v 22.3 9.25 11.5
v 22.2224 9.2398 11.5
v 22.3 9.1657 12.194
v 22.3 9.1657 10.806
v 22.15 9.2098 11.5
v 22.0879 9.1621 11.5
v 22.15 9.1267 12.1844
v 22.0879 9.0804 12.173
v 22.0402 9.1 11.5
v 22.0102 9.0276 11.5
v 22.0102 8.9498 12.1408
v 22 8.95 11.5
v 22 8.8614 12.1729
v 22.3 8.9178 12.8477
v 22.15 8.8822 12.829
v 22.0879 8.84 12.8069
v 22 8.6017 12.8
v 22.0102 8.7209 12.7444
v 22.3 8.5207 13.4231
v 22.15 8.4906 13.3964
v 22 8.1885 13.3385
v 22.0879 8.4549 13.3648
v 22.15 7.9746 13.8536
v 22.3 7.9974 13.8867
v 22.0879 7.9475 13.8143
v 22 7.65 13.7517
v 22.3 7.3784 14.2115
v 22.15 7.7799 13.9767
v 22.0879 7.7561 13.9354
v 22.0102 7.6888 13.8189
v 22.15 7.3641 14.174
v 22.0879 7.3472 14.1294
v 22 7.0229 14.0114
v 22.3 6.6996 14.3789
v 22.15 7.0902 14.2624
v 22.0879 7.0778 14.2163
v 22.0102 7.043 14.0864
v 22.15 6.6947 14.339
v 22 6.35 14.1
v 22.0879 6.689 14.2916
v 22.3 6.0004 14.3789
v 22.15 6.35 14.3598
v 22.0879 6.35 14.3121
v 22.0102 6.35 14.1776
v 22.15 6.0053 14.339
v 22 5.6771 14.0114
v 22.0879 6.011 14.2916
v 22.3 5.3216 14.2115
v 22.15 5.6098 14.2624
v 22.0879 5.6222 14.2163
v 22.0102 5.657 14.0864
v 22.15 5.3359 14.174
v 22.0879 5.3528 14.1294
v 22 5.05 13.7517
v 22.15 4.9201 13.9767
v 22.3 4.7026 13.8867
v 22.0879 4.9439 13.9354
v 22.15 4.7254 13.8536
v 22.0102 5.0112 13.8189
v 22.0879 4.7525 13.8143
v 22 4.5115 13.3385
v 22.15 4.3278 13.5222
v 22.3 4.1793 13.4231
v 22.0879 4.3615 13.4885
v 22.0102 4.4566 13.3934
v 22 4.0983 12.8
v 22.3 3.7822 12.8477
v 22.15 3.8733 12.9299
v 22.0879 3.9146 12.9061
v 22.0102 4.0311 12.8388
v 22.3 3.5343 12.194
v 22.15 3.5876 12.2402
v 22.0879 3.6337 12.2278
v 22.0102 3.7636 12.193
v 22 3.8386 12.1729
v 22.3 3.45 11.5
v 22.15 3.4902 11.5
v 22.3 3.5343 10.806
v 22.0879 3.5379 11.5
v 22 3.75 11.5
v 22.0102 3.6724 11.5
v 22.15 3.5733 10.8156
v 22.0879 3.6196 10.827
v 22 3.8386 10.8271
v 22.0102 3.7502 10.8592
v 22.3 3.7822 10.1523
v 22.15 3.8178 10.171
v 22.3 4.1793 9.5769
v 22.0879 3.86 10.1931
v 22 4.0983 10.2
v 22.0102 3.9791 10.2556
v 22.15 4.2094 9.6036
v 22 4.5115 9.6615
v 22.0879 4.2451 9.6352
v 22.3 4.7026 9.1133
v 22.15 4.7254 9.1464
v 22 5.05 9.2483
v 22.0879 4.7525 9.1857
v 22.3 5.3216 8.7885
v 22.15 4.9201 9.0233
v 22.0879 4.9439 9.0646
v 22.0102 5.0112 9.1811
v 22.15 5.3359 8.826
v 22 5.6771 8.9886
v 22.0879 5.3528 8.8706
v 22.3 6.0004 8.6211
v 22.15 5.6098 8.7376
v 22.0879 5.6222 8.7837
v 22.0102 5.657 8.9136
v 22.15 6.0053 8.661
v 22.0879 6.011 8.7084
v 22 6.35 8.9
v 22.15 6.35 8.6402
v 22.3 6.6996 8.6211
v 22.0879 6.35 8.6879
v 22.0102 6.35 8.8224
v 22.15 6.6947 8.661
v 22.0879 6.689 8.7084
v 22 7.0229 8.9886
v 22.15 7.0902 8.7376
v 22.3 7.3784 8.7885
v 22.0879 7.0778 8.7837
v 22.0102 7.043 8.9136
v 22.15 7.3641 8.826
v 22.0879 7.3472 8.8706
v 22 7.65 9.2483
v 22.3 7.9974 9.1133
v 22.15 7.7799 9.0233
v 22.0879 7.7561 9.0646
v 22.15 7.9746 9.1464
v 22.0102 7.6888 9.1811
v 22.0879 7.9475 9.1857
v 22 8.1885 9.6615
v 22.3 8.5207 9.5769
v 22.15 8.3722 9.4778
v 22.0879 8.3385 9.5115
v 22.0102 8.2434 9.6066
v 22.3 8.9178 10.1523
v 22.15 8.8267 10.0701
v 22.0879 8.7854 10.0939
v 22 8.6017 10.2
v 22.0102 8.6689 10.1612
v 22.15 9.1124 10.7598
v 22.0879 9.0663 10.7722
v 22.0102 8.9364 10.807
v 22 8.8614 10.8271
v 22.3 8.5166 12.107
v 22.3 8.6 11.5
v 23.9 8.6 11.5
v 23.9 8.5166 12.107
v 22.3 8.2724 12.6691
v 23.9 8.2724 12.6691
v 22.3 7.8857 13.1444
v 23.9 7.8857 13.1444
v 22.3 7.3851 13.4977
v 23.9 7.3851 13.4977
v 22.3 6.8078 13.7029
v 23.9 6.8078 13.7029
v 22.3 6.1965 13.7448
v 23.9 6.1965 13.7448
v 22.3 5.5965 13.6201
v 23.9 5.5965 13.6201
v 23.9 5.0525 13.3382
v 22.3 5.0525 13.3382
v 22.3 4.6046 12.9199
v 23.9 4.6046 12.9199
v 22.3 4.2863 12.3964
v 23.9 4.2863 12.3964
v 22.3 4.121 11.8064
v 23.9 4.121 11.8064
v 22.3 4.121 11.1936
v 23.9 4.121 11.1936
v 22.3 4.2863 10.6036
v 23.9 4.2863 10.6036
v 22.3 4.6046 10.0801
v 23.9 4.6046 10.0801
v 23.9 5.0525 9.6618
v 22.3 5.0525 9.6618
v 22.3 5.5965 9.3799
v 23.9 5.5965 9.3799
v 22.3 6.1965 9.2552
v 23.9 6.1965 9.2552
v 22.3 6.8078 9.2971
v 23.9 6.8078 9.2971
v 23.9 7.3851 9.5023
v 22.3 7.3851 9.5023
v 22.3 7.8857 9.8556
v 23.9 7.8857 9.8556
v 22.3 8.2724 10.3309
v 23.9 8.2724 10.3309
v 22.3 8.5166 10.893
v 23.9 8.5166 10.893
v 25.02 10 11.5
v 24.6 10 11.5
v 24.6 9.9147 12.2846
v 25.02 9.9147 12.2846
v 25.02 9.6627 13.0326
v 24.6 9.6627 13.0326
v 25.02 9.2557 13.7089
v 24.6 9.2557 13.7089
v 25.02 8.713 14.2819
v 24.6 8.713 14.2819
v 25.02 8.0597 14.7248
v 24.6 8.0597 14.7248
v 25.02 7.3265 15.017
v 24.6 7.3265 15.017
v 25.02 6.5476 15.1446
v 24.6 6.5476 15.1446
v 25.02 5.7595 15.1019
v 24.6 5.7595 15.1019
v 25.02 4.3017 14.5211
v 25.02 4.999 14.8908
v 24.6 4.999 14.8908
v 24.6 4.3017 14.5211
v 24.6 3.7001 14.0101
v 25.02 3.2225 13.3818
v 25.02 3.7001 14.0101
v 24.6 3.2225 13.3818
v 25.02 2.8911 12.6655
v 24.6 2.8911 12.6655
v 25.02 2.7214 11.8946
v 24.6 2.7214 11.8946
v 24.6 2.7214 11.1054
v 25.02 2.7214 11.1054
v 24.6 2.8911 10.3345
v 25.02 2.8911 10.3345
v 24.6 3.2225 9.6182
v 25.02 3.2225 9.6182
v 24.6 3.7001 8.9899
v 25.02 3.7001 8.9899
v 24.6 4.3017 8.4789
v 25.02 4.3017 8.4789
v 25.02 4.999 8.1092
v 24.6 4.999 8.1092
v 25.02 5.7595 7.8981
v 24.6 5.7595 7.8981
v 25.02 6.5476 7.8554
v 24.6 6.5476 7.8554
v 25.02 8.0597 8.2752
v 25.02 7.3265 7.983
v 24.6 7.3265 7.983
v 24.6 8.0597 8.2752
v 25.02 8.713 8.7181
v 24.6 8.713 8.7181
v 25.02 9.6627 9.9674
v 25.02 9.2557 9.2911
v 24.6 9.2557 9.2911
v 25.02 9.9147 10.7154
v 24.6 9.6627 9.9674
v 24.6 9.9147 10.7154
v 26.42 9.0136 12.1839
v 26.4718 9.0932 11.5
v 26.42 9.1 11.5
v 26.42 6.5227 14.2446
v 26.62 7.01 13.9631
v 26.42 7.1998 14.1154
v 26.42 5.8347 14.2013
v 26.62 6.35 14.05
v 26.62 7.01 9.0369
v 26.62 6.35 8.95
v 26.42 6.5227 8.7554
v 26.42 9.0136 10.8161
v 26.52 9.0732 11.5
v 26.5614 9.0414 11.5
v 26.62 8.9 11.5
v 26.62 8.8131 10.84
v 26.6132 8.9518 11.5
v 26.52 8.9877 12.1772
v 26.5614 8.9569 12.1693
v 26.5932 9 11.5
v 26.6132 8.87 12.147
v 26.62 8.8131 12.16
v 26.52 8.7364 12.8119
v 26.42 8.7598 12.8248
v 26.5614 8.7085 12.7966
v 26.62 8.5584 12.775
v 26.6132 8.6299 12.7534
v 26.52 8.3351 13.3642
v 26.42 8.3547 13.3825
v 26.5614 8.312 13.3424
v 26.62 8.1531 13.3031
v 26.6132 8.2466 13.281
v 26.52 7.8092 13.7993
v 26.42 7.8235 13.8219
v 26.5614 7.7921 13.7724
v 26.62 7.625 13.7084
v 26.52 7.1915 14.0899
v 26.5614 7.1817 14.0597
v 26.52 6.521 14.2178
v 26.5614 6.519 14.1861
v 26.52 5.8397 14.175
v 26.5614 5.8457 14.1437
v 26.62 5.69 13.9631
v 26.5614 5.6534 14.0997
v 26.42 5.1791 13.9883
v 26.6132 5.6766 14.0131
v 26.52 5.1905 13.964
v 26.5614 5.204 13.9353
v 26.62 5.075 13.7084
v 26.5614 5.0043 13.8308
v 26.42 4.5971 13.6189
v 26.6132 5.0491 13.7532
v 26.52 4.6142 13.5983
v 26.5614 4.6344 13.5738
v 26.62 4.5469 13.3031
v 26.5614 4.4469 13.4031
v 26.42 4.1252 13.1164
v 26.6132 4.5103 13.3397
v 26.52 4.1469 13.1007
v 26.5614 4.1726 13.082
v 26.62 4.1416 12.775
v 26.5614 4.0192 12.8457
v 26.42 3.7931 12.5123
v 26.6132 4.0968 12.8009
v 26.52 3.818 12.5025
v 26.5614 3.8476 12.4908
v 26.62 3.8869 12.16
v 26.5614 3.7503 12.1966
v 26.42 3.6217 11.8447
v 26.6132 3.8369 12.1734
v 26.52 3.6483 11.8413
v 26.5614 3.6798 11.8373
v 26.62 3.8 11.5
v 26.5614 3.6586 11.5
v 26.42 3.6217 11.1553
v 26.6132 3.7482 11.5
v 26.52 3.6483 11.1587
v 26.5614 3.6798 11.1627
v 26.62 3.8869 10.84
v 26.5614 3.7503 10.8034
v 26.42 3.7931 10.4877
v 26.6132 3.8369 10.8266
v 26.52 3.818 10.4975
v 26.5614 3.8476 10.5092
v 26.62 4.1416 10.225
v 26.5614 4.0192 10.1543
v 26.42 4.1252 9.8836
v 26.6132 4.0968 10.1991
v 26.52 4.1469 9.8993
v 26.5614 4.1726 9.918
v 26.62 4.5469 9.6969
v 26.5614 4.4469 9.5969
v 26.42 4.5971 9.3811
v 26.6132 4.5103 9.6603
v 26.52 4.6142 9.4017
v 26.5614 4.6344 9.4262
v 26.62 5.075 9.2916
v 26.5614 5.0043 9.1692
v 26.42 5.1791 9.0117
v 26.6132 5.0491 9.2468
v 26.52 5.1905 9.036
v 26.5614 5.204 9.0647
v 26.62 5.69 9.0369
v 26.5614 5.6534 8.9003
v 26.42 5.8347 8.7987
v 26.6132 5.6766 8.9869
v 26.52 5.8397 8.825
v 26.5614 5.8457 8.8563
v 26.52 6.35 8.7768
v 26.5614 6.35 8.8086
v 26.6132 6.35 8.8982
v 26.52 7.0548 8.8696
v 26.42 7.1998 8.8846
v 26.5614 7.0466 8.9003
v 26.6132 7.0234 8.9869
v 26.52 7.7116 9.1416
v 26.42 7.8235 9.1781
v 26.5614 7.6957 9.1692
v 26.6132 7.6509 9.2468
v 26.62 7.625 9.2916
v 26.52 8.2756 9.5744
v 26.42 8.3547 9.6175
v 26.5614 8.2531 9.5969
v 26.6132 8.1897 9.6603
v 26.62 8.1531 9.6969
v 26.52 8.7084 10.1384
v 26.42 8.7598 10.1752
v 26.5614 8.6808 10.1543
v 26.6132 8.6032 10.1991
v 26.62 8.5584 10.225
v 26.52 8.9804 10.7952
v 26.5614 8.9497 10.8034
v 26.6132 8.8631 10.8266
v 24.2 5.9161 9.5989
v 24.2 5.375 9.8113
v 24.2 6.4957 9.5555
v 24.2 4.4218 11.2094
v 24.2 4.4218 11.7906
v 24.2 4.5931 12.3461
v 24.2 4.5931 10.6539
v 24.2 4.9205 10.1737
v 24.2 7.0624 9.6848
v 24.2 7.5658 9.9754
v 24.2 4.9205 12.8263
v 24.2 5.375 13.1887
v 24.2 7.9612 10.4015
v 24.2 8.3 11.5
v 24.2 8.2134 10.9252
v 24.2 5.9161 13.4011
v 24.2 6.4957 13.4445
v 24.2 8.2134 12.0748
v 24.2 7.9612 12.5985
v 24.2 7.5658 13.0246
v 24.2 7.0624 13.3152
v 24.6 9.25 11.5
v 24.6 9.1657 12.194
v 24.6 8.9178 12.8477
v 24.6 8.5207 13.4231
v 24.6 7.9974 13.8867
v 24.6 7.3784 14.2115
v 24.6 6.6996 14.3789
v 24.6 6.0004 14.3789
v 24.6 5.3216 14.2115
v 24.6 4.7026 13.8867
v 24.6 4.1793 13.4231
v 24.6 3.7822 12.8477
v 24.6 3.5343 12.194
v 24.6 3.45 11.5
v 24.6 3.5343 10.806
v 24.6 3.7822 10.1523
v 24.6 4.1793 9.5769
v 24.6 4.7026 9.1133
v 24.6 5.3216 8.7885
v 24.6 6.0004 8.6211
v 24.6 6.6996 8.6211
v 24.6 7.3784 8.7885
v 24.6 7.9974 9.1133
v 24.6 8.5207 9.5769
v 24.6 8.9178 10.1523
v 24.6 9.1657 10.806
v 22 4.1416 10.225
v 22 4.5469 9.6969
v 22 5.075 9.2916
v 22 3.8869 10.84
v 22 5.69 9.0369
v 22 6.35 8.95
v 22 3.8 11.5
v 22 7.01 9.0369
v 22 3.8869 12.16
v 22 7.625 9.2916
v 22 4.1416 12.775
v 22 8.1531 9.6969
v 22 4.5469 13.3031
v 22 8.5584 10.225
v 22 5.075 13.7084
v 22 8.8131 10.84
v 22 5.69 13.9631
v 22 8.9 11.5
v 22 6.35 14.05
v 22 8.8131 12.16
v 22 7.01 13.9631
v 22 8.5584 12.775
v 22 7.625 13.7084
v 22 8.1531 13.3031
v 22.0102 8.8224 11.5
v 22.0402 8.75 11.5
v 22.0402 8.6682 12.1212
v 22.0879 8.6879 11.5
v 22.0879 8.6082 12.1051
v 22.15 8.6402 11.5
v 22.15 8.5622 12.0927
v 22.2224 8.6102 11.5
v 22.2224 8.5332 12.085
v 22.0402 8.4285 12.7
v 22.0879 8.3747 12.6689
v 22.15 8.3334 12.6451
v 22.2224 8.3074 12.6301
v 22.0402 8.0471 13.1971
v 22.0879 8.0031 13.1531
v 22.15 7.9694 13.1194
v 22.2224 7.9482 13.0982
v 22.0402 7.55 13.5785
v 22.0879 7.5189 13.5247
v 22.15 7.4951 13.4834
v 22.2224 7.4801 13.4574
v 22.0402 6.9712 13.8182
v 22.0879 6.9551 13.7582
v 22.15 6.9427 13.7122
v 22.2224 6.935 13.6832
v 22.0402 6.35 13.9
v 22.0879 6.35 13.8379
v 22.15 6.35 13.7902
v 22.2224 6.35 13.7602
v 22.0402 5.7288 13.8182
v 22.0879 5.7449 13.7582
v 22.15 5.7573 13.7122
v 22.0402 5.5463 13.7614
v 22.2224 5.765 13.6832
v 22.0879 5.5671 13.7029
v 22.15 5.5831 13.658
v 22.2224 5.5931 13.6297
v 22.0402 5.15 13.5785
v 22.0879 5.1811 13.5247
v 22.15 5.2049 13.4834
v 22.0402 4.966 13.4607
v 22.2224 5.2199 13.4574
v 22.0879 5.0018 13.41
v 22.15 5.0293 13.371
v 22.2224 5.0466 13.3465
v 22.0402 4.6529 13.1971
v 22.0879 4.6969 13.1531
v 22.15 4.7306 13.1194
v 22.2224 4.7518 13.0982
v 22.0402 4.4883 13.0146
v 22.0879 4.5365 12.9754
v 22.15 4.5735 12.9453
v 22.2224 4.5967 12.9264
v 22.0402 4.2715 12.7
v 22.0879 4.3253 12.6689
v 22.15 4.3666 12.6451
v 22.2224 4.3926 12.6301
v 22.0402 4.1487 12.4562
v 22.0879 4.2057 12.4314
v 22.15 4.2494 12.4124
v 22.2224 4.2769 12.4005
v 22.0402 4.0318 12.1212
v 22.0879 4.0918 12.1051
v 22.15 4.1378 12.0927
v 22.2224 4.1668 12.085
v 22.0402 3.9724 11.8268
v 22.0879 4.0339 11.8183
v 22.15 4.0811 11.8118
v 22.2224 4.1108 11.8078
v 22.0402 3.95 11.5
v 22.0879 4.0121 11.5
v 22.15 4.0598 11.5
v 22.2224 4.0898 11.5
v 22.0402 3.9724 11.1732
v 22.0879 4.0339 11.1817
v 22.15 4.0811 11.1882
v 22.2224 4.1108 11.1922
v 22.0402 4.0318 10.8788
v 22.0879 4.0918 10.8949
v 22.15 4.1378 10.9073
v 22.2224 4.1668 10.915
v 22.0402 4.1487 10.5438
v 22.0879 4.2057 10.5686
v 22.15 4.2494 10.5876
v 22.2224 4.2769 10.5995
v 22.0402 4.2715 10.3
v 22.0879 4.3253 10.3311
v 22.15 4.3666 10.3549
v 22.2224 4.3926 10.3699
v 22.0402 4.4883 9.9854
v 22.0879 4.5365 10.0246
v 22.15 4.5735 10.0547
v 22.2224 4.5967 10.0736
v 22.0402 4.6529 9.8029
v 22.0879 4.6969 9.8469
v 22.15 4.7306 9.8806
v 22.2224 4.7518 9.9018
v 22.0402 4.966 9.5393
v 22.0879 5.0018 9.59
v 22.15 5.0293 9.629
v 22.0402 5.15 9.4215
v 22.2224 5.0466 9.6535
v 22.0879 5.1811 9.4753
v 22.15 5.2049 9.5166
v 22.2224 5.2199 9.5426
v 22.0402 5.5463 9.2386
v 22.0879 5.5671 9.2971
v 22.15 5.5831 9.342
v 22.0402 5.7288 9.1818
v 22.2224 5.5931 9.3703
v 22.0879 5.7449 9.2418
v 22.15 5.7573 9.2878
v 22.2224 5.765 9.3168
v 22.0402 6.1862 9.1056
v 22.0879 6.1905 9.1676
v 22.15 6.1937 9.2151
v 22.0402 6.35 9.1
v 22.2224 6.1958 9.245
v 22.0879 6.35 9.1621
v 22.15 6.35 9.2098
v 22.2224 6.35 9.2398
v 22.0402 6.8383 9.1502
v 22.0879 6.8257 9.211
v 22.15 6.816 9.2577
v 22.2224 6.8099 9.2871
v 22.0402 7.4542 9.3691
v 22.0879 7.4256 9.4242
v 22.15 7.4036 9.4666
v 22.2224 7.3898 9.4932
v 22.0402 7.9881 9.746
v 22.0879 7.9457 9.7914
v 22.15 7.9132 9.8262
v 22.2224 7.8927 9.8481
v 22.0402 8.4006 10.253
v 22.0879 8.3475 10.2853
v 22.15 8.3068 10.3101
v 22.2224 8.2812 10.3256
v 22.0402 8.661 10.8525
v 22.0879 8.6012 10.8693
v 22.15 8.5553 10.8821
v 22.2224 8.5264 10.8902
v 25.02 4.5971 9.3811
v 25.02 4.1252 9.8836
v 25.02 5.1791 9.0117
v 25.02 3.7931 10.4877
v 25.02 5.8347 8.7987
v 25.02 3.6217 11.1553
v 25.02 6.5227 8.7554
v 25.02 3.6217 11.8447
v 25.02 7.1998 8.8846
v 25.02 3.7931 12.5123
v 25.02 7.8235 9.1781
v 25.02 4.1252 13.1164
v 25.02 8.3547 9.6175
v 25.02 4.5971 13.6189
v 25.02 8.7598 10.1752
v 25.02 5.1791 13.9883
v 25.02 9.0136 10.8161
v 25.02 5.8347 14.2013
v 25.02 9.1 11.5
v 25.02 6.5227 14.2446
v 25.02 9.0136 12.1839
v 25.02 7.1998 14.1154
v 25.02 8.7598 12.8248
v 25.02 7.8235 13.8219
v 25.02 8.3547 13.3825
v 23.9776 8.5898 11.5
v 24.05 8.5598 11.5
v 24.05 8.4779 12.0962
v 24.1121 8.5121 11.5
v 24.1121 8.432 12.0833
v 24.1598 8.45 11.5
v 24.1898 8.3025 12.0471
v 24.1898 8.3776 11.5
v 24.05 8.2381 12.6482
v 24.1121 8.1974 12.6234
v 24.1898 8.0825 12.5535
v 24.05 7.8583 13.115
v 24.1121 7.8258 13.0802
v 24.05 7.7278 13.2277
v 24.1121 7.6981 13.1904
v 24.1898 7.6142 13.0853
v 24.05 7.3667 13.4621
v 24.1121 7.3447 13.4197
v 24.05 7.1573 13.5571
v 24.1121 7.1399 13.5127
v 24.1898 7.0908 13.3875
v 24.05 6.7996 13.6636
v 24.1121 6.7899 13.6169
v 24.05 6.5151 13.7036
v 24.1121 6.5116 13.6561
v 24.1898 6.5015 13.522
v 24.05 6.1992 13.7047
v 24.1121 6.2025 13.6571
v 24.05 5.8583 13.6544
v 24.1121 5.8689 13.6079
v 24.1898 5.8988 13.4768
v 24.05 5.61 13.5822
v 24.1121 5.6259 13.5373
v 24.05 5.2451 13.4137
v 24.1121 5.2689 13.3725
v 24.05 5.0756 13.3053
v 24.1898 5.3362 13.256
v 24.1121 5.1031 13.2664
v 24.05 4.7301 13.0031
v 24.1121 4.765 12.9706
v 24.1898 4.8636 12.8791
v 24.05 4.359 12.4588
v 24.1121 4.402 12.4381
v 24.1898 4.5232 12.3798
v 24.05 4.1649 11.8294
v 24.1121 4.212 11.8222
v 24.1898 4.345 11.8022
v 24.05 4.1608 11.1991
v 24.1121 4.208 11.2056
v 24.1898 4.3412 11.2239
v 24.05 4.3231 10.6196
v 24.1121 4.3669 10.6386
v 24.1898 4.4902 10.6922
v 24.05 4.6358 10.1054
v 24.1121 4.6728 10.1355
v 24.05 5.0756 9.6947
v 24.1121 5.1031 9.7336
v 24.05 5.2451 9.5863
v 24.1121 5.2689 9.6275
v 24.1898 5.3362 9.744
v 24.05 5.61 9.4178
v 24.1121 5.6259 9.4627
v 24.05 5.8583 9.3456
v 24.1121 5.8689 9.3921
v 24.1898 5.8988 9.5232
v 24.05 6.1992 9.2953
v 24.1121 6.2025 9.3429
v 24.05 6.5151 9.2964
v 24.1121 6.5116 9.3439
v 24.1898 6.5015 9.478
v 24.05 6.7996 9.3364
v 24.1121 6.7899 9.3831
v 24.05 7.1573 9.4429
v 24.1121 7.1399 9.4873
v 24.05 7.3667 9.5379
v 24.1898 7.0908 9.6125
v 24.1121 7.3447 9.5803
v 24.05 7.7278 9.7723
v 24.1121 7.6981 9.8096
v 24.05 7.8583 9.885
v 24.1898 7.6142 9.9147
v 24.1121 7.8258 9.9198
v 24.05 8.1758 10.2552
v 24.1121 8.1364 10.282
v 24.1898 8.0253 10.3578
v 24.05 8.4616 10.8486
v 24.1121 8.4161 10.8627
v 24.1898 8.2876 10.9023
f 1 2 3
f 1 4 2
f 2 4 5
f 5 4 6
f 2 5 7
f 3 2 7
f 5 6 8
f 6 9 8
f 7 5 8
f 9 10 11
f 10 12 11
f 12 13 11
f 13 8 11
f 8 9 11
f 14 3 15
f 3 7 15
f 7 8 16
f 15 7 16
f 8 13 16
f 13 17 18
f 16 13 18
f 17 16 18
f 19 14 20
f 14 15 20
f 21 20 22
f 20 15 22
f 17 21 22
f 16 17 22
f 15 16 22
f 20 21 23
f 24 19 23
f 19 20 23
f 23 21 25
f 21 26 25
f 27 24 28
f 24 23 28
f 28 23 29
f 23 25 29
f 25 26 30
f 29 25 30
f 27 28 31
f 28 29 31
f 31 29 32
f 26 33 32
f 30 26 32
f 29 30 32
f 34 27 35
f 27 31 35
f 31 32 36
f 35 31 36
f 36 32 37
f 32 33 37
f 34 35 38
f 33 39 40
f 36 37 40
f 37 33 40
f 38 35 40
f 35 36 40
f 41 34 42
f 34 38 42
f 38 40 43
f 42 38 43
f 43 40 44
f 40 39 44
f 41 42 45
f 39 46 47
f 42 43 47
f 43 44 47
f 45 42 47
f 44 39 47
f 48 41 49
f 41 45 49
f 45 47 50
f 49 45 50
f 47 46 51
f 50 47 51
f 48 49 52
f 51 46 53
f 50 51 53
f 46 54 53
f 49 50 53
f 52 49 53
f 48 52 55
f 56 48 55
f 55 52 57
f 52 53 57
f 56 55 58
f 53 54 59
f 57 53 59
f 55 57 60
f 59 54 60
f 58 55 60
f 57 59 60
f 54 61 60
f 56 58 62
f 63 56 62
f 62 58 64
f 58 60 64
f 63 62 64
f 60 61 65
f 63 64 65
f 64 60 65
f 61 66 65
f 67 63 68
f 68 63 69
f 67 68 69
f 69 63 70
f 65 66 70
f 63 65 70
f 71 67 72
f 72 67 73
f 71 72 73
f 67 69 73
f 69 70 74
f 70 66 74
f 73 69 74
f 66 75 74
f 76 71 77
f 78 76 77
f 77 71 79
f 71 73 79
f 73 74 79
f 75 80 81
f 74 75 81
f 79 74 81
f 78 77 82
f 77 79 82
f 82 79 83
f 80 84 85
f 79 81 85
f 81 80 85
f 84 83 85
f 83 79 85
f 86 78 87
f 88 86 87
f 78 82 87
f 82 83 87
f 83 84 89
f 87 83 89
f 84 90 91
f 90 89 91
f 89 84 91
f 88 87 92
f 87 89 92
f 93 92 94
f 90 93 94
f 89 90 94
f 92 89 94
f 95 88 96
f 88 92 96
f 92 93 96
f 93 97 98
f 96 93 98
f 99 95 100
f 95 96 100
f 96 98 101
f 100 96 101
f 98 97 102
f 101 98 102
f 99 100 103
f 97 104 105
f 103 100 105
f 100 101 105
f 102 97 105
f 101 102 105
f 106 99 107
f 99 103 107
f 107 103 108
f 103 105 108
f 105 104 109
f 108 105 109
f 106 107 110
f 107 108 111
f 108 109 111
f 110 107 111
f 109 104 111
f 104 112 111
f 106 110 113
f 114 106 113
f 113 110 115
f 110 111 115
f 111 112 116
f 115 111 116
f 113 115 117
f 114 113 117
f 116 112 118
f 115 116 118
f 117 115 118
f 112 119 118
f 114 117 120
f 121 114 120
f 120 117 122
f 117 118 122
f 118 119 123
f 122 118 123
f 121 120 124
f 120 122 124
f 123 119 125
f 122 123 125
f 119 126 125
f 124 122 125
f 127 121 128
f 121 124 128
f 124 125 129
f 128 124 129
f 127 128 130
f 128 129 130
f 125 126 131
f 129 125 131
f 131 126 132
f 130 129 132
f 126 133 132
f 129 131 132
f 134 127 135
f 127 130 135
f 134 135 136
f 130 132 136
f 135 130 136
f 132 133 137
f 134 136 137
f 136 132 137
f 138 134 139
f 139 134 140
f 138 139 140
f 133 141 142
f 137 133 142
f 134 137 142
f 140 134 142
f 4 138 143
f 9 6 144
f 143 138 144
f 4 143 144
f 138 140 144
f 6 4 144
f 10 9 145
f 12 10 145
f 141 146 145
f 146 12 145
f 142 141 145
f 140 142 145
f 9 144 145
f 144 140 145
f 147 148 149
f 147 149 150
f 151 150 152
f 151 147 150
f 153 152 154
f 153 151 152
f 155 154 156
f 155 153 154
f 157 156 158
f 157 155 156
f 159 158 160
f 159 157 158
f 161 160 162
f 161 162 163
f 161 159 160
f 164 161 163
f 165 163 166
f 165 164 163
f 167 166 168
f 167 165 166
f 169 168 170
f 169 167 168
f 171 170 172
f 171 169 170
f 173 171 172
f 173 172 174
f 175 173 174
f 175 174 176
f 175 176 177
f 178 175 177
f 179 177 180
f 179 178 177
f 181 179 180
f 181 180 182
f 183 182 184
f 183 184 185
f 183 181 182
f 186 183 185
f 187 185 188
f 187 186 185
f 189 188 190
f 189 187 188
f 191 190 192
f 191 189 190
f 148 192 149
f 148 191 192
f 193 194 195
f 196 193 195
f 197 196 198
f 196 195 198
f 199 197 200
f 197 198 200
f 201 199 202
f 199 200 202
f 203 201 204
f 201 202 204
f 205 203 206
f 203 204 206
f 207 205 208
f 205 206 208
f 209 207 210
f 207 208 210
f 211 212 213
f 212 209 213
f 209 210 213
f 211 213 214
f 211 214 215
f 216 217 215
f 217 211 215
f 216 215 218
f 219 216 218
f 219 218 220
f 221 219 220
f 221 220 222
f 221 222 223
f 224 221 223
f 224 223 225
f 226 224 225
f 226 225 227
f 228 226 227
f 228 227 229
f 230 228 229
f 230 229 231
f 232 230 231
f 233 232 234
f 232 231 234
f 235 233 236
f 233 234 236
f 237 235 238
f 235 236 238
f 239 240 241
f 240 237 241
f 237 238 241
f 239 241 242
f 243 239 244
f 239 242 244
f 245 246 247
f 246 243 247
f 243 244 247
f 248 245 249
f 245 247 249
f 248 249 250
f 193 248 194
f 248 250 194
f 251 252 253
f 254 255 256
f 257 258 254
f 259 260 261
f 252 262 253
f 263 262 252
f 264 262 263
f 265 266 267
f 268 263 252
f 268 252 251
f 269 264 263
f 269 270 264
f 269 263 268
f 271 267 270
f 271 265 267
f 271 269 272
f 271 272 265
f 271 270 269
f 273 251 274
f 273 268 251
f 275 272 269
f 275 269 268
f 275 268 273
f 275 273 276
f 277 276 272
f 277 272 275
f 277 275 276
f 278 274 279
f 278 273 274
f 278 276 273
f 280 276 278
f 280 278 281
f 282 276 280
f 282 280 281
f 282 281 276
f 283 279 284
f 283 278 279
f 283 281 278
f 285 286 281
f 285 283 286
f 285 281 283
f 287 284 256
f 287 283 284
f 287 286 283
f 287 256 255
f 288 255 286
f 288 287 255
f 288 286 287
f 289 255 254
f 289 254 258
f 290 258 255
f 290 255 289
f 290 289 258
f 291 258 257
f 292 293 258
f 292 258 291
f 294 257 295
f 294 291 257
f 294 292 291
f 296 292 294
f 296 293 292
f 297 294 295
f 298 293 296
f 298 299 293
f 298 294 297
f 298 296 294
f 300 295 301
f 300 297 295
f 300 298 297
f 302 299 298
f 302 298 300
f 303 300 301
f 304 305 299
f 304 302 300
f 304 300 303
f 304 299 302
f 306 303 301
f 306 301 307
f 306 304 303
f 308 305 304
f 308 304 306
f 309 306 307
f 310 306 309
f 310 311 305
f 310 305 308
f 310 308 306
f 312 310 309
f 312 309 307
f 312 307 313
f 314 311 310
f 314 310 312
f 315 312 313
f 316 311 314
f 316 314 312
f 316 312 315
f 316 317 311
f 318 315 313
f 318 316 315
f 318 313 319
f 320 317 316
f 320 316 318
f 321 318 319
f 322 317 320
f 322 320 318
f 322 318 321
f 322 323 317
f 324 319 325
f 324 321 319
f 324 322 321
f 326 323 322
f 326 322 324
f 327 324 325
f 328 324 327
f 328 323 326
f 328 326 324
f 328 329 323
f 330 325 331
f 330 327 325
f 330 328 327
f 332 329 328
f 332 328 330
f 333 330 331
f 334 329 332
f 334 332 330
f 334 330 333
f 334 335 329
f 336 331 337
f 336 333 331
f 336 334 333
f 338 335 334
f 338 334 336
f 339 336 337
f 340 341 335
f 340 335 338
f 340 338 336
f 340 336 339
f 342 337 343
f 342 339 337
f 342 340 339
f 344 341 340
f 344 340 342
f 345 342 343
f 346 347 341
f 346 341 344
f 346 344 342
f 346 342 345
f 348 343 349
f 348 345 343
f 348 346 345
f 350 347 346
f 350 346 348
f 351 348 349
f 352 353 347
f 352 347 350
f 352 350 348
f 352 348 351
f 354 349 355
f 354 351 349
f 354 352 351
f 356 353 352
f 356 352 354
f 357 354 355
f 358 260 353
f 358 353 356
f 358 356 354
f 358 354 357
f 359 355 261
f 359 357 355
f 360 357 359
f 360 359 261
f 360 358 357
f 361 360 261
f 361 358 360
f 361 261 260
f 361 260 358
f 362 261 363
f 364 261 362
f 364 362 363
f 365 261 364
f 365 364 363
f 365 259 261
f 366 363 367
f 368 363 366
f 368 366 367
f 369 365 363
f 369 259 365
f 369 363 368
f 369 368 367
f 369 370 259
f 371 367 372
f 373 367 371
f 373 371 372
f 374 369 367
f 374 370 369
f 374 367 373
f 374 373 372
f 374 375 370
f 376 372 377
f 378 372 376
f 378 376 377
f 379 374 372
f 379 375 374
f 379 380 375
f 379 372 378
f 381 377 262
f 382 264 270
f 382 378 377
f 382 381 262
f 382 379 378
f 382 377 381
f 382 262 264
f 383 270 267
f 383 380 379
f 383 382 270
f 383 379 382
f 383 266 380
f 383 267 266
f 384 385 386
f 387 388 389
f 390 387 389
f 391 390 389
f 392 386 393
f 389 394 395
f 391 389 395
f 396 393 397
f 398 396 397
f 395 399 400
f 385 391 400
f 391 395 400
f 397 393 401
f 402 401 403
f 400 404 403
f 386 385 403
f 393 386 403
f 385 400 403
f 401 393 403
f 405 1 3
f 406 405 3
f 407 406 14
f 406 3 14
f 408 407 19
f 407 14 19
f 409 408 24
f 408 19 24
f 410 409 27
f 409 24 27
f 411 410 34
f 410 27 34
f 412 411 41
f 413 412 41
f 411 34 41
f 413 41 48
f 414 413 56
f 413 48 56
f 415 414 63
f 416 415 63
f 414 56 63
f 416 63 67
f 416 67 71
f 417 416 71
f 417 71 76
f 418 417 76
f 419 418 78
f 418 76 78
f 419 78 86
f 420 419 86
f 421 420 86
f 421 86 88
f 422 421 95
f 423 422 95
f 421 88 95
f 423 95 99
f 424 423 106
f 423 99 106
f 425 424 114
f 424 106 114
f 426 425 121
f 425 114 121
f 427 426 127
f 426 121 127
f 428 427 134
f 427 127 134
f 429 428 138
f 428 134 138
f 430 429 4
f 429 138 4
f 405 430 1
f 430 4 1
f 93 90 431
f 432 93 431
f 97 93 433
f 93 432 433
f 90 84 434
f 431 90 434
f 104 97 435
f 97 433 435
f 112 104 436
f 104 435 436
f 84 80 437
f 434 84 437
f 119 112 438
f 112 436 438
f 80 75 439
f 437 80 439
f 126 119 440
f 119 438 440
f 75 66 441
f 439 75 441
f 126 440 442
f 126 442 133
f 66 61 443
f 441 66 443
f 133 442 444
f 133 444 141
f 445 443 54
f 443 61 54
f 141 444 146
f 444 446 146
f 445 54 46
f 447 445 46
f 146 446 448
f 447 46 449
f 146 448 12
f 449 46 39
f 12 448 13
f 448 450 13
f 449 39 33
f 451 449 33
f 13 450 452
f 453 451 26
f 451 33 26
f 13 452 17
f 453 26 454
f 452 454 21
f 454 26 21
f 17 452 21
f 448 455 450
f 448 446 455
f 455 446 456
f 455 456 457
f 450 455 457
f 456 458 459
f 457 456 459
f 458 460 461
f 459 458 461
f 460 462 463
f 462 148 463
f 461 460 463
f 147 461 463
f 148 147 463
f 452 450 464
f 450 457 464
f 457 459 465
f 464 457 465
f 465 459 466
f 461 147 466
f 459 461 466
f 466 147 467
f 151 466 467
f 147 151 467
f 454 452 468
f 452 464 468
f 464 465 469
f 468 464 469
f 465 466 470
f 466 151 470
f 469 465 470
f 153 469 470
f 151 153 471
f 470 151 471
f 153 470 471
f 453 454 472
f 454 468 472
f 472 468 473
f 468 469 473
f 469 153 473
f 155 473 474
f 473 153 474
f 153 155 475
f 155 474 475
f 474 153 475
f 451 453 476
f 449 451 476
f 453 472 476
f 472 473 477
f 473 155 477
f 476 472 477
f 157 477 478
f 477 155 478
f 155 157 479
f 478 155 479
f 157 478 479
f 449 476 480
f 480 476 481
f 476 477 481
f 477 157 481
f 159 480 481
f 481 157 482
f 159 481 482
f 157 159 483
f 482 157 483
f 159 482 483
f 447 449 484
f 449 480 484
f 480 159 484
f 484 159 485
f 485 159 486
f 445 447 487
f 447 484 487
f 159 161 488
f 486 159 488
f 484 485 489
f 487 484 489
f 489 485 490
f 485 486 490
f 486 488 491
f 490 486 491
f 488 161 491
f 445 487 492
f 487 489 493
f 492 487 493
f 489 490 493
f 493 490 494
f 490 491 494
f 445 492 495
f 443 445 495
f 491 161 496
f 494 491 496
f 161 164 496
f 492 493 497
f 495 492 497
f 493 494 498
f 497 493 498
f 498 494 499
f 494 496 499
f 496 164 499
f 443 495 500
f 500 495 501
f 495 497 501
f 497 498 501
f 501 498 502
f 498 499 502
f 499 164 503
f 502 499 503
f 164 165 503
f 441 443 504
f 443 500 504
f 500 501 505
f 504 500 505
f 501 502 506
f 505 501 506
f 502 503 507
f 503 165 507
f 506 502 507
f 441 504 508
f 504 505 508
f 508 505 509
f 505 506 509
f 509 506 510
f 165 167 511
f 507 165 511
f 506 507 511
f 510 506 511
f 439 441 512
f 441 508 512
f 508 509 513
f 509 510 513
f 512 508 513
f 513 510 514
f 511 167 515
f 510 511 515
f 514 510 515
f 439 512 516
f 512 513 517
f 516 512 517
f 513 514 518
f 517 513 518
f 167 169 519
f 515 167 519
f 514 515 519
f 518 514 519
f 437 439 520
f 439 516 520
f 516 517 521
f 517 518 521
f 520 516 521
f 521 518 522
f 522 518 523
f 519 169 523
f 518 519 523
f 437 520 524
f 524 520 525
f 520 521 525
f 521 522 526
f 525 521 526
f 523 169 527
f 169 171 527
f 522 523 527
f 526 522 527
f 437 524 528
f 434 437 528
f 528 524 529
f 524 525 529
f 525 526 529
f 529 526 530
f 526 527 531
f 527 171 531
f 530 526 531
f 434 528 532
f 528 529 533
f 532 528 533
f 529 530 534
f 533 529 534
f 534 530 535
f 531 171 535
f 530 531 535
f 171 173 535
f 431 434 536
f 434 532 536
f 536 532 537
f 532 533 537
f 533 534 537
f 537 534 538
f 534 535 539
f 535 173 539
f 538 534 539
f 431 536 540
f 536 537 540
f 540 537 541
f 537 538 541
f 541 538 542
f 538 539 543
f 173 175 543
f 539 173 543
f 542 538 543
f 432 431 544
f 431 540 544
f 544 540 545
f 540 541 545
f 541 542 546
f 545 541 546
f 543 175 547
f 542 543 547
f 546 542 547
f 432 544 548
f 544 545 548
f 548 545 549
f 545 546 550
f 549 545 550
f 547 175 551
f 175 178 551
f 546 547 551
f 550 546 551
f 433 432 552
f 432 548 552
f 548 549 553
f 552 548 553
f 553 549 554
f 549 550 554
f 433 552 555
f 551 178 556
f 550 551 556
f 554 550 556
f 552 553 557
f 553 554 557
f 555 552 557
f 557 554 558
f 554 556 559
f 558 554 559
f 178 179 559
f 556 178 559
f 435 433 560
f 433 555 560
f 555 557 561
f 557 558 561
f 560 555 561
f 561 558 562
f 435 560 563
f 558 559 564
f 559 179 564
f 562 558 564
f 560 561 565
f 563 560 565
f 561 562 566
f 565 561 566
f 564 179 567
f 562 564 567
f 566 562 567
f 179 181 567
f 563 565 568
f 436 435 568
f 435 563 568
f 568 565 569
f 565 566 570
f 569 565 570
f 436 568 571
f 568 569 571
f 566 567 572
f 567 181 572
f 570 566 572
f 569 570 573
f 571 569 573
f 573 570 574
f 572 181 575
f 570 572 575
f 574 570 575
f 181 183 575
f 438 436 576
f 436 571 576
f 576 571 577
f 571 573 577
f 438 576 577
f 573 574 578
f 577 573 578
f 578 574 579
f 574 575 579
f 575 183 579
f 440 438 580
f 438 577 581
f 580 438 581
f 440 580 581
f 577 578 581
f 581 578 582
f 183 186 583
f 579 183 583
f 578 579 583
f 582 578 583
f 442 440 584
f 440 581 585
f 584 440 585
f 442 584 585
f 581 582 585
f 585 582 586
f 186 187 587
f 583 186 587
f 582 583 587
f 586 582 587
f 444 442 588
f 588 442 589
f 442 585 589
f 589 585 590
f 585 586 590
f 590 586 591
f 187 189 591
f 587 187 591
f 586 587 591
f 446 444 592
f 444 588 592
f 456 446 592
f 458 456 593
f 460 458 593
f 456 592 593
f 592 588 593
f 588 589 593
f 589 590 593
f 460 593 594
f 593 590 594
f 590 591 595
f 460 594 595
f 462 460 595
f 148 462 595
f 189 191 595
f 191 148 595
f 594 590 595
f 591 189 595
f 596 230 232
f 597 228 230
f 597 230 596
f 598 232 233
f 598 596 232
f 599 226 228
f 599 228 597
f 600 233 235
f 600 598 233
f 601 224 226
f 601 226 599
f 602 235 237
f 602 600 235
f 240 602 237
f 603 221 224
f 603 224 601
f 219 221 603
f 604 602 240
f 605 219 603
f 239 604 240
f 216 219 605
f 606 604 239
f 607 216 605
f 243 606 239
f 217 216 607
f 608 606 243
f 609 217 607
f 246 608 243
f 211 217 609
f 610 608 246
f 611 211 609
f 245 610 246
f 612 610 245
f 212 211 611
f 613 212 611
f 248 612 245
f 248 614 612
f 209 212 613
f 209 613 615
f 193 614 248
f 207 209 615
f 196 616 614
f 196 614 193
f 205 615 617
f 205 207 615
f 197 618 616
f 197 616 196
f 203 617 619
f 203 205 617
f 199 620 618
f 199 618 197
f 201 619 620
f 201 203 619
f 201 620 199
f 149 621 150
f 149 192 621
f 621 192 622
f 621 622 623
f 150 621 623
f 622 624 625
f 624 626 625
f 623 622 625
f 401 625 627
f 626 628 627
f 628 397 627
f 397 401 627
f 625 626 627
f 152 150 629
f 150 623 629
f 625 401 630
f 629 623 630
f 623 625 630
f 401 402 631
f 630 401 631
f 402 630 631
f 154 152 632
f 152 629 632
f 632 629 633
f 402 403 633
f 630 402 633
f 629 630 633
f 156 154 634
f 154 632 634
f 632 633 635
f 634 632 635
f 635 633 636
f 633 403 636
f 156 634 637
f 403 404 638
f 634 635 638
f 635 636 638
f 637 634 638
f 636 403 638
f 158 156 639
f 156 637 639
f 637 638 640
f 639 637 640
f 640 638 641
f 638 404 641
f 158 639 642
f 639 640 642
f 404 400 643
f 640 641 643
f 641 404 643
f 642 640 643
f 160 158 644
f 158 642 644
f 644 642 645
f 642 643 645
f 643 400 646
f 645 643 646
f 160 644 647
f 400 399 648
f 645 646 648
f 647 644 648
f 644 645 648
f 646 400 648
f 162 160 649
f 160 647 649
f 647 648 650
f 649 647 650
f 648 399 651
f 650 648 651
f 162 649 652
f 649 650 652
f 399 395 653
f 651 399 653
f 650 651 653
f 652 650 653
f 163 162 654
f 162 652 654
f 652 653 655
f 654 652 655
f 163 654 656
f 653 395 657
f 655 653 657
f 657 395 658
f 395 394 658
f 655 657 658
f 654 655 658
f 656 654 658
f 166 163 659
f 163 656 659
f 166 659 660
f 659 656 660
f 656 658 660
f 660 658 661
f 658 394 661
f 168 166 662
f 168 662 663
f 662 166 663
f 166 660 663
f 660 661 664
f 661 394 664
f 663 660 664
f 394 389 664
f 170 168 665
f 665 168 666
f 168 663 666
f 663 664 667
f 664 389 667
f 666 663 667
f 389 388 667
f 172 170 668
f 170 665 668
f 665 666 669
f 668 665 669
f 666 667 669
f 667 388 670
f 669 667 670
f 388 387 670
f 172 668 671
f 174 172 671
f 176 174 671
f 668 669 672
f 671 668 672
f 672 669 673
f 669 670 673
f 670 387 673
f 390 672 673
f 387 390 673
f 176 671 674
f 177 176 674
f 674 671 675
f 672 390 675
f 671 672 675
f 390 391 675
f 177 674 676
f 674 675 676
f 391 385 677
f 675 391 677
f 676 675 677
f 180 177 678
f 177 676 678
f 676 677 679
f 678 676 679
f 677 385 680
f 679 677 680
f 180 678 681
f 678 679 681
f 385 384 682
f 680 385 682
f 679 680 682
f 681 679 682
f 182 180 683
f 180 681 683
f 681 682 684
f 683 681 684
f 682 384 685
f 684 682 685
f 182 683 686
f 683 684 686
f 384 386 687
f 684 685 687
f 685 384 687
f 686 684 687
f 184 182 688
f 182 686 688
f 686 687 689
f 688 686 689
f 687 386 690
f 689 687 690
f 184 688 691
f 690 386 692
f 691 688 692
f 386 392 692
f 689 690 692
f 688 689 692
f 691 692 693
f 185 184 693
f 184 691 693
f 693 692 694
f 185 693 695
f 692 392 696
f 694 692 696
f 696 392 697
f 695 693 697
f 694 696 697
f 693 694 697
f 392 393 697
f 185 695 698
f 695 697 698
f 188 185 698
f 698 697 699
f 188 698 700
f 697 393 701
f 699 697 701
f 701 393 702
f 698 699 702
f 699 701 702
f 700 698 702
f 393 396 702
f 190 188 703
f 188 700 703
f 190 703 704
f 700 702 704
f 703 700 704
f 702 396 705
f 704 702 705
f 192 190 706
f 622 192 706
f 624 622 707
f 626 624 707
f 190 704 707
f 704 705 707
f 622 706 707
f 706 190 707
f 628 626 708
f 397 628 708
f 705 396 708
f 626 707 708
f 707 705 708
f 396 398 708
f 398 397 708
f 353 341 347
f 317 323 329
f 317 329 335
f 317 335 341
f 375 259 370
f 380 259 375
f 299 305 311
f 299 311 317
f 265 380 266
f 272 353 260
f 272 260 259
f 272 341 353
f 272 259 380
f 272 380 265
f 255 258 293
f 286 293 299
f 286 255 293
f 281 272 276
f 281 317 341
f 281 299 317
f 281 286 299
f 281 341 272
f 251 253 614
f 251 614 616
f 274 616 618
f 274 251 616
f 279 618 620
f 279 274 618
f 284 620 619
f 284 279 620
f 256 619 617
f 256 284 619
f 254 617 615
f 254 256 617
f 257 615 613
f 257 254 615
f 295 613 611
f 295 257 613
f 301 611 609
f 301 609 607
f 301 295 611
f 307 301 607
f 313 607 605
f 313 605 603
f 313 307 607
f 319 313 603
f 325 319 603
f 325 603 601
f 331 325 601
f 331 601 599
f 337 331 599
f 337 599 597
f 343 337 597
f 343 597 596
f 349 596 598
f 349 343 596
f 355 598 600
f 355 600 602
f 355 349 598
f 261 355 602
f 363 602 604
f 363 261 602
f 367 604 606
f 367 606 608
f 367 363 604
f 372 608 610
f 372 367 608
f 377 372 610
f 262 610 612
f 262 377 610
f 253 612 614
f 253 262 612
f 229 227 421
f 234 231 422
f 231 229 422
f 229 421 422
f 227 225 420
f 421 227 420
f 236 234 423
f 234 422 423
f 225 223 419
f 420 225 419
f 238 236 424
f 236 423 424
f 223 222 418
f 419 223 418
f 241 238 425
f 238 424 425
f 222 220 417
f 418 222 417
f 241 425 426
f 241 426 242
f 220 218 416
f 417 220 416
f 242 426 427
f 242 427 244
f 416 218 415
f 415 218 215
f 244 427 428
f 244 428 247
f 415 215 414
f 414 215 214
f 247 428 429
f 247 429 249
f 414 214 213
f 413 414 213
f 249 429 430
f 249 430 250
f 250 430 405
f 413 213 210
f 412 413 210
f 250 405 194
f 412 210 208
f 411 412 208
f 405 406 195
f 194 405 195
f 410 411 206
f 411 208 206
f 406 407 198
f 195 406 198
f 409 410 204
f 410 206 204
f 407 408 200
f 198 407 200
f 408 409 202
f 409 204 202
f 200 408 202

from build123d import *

# Parameters (mm, degrees)
SKETCH013_R     = 3.65
PAD006_DEPTH    = 4.62
SKETCH014_R     = 2.25
POCKET007_DEPTH = 2.2
SKETCH015_R     = 4.5
SKETCH015_R_2   = 2.9
POCKET008_DEPTH = 2.6
SKETCH016_R     = 4.5
SKETCH016_R_2   = 2.75
POCKET009_DEPTH = 1.6
FILLET004_R     = 0.2
FILLET005_R     = 0.3
FILLET006_R     = 0.3


with BuildPart() as part:
    # Sketch013 → Pad006 (new body)
    with BuildSketch(Plane.YZ):
        Circle(SKETCH013_R)
    extrude(amount=PAD006_DEPTH)

    # Sketch014 → Pocket007 (cut)
    with BuildSketch(Plane.YZ):
        Circle(SKETCH014_R)
    extrude(amount=POCKET007_DEPTH, mode=Mode.SUBTRACT)

    # Sketch015 → Pocket008 (cut)
    with BuildSketch(Plane.YZ):
        Circle(SKETCH015_R)
        Circle(SKETCH015_R_2, mode=Mode.SUBTRACT)
    extrude(amount=POCKET008_DEPTH, mode=Mode.SUBTRACT)

    # Sketch016 (on Face3 of Pocket008) → Pocket009 (cut)
    with BuildSketch(Plane.YZ.offset(4.62)):
        Circle(SKETCH016_R)
        Circle(SKETCH016_R_2, mode=Mode.SUBTRACT)
    extrude(amount=-POCKET009_DEPTH, mode=Mode.SUBTRACT)

    # Fillet004
    fillet004_edges = [part.edges().sort_by_distance(p)[0] for p in [
        (4.62, -2.75, 0),
    ]]
    fillet(fillet004_edges, radius=FILLET004_R)

    # Fillet005
    fillet005_edges = [part.edges().sort_by_distance(p)[0] for p in [
        (0, -2.25, 0),
        (0, -2.9, 0),
    ]]
    fillet(fillet005_edges, radius=FILLET005_R)

    # Fillet006
    fillet006_edges = [part.edges().sort_by_distance(p)[0] for p in [
        (2.2, -2.25, 0),
    ]]
    fillet(fillet006_edges, radius=FILLET006_R)


with BuildPart() as part_1:
    # Body002 placement: moved
    add(part.part.moved(Location((22, 6.35, 11.5))))


solid = part_1.part
